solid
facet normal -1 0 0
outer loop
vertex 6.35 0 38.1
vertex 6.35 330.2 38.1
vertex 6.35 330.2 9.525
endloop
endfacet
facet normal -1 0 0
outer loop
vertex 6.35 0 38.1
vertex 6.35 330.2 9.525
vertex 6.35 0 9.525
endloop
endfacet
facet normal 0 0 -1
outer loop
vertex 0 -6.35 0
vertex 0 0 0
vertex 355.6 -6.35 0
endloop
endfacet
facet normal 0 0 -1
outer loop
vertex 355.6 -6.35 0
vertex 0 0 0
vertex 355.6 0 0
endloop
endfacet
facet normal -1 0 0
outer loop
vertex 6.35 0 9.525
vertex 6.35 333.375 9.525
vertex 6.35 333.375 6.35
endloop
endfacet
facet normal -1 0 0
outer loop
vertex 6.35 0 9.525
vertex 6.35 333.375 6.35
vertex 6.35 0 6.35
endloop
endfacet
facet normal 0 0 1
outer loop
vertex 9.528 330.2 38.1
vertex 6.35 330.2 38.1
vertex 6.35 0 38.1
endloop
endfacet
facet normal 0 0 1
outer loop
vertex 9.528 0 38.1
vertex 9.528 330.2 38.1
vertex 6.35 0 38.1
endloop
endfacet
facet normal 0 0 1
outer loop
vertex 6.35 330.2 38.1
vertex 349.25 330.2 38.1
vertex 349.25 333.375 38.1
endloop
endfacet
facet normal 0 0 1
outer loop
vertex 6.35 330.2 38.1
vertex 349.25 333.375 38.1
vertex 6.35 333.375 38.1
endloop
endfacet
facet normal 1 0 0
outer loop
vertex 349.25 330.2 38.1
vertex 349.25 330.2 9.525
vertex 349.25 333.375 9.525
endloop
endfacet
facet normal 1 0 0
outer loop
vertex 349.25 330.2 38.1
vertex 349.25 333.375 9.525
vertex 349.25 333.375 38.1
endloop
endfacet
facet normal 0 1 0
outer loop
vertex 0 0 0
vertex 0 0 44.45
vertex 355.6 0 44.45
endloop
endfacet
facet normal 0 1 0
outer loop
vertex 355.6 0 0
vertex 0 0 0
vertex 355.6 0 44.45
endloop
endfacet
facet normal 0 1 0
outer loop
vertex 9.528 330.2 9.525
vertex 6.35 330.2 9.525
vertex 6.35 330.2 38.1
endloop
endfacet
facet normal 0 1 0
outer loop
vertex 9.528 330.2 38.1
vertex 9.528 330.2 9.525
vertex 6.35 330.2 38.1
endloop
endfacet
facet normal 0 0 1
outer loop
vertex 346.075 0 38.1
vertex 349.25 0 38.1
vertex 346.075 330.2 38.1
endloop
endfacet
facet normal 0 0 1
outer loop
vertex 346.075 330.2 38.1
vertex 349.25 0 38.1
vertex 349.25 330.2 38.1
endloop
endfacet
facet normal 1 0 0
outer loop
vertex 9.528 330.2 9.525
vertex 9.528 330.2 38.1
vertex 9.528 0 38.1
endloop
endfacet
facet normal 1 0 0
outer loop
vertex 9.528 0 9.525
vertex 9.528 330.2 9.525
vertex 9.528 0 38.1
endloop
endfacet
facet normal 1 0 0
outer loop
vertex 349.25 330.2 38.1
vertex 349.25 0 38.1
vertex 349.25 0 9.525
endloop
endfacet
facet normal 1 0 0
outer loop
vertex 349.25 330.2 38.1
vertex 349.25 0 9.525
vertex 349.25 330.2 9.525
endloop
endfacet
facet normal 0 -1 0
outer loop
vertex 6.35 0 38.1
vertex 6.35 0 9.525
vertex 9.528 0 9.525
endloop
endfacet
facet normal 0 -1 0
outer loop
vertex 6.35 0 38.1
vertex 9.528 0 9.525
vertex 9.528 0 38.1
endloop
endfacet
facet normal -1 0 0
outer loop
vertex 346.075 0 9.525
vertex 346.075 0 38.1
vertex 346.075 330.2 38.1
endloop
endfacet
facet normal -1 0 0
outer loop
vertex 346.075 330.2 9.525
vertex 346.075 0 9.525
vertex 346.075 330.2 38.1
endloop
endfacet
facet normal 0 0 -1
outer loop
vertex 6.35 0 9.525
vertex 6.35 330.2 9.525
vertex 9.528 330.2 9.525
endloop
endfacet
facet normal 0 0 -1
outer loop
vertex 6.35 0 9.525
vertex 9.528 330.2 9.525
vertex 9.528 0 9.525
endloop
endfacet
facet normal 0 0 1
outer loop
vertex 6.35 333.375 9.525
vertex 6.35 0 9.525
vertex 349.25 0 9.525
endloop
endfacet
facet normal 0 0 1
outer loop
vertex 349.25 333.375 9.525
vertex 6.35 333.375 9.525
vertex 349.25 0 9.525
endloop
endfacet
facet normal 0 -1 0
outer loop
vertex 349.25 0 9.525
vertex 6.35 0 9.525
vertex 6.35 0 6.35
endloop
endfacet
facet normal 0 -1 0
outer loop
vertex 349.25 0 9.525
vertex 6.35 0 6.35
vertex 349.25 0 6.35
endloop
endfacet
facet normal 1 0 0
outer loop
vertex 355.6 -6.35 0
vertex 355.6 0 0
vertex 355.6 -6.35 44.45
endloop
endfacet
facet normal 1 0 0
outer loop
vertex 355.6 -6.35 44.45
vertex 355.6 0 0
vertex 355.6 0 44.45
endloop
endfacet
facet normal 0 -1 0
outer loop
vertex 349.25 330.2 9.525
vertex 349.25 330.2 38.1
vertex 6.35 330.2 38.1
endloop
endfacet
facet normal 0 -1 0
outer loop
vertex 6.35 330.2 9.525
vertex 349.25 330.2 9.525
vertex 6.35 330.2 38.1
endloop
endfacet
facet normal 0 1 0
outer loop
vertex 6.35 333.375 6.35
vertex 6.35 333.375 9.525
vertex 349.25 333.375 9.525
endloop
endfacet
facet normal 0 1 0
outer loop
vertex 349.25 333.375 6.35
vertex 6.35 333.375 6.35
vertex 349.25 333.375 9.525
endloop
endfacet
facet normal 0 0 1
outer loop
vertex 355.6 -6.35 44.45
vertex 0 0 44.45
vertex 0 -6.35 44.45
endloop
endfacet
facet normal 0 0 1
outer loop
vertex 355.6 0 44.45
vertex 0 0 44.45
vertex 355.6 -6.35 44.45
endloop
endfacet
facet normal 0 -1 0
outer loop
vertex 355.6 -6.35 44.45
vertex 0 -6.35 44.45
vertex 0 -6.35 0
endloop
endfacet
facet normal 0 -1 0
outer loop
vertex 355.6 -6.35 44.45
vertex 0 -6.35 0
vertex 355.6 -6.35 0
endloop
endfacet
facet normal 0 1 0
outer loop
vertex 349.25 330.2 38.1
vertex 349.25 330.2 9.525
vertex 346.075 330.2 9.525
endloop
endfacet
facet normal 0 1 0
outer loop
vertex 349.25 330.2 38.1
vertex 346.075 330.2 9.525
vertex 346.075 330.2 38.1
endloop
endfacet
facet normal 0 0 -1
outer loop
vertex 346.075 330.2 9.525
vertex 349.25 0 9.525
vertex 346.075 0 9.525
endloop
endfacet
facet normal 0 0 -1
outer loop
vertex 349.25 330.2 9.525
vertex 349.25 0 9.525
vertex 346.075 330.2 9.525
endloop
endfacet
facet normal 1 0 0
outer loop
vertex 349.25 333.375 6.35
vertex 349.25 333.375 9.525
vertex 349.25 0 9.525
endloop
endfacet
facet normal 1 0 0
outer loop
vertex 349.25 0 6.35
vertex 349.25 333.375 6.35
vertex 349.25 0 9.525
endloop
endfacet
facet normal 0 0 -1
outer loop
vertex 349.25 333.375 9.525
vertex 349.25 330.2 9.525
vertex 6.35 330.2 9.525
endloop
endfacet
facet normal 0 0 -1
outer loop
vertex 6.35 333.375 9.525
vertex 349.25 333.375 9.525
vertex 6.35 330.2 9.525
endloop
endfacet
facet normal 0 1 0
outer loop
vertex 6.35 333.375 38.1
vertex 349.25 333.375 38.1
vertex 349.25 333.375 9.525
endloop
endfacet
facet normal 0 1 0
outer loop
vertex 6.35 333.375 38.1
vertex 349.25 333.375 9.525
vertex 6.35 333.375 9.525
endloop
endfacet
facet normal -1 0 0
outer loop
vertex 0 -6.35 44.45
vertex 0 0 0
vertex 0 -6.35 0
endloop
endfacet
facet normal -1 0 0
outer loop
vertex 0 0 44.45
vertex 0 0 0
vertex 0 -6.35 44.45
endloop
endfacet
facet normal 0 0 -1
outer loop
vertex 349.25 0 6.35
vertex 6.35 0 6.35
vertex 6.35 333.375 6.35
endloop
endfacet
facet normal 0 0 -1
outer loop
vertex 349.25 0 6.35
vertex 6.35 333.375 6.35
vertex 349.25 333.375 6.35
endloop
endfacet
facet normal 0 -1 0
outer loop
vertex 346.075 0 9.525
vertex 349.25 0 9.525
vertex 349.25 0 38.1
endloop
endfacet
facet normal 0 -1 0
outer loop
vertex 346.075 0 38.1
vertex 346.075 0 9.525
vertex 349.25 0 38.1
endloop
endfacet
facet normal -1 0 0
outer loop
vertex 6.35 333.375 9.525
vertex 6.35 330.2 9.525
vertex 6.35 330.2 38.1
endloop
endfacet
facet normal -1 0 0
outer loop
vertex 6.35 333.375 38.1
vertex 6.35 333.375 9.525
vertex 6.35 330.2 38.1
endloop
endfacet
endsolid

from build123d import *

# Parameters (mm, degrees)
F0_W      = 355.6
F0_H      = 44.45
F1_DEPTH  = 6.35
F4_W      = 330.2
F4_H      = 28.575
F5_DEPTH  = 3.175
F6_W      = 330.2
F6_H      = 28.575
F7_DEPTH  = 3.17754
F8_W      = 342.9
F8_H      = 28.575
F9_DEPTH  = 3.175
F10_W     = 342.9
F10_H     = 333.375
F11_DEPTH = 3.175


with BuildPart() as f1:
    # F0 (on Front) → F1 (new body)
    with BuildSketch(Plane.XZ):
        with Locations((177.8, 22.225)):
            Rectangle(F0_W, F0_H)
    extrude(amount=F1_DEPTH)


with BuildPart() as f5:
    # F4 (on offset) → F5 (new body)
    with BuildSketch(Plane.YZ.offset(349.25)):
        with Locations((165.1, 23.8125)):
            Rectangle(F4_W, F4_H)
    extrude(amount=-F5_DEPTH)


with BuildPart() as f7:
    # F6 (on offset) → F7 (new body)
    with BuildSketch(Plane(origin=(6.35, 0, 0), x_dir=(0, -1, 0), z_dir=(-1, 0, 0))):
        with Locations((-165.1, 23.8125)):
            Rectangle(F6_W, F6_H)
    extrude(amount=-F7_DEPTH)


with BuildPart() as f9:
    # F8 (on face) → F9 (new body)
    with BuildSketch(Plane(origin=(0, 330.2, 0), x_dir=(-1, 0, 0), z_dir=(0, 1, 0))):
        with Locations((-177.8, 23.8125)):
            Rectangle(F8_W, F8_H)
    extrude(amount=F9_DEPTH)


with BuildPart() as f11:
    # F10 (on face) → F11 (new body)
    with BuildSketch(Plane(origin=(0, 0, 9.525), x_dir=(1, 0, 0), z_dir=(0, 0, -1))):
        with Locations((177.8, -166.6875)):
            Rectangle(F10_W, F10_H)
    extrude(amount=F11_DEPTH)


solid = Compound([f1.part, f5.part, f7.part, f9.part, f11.part])
